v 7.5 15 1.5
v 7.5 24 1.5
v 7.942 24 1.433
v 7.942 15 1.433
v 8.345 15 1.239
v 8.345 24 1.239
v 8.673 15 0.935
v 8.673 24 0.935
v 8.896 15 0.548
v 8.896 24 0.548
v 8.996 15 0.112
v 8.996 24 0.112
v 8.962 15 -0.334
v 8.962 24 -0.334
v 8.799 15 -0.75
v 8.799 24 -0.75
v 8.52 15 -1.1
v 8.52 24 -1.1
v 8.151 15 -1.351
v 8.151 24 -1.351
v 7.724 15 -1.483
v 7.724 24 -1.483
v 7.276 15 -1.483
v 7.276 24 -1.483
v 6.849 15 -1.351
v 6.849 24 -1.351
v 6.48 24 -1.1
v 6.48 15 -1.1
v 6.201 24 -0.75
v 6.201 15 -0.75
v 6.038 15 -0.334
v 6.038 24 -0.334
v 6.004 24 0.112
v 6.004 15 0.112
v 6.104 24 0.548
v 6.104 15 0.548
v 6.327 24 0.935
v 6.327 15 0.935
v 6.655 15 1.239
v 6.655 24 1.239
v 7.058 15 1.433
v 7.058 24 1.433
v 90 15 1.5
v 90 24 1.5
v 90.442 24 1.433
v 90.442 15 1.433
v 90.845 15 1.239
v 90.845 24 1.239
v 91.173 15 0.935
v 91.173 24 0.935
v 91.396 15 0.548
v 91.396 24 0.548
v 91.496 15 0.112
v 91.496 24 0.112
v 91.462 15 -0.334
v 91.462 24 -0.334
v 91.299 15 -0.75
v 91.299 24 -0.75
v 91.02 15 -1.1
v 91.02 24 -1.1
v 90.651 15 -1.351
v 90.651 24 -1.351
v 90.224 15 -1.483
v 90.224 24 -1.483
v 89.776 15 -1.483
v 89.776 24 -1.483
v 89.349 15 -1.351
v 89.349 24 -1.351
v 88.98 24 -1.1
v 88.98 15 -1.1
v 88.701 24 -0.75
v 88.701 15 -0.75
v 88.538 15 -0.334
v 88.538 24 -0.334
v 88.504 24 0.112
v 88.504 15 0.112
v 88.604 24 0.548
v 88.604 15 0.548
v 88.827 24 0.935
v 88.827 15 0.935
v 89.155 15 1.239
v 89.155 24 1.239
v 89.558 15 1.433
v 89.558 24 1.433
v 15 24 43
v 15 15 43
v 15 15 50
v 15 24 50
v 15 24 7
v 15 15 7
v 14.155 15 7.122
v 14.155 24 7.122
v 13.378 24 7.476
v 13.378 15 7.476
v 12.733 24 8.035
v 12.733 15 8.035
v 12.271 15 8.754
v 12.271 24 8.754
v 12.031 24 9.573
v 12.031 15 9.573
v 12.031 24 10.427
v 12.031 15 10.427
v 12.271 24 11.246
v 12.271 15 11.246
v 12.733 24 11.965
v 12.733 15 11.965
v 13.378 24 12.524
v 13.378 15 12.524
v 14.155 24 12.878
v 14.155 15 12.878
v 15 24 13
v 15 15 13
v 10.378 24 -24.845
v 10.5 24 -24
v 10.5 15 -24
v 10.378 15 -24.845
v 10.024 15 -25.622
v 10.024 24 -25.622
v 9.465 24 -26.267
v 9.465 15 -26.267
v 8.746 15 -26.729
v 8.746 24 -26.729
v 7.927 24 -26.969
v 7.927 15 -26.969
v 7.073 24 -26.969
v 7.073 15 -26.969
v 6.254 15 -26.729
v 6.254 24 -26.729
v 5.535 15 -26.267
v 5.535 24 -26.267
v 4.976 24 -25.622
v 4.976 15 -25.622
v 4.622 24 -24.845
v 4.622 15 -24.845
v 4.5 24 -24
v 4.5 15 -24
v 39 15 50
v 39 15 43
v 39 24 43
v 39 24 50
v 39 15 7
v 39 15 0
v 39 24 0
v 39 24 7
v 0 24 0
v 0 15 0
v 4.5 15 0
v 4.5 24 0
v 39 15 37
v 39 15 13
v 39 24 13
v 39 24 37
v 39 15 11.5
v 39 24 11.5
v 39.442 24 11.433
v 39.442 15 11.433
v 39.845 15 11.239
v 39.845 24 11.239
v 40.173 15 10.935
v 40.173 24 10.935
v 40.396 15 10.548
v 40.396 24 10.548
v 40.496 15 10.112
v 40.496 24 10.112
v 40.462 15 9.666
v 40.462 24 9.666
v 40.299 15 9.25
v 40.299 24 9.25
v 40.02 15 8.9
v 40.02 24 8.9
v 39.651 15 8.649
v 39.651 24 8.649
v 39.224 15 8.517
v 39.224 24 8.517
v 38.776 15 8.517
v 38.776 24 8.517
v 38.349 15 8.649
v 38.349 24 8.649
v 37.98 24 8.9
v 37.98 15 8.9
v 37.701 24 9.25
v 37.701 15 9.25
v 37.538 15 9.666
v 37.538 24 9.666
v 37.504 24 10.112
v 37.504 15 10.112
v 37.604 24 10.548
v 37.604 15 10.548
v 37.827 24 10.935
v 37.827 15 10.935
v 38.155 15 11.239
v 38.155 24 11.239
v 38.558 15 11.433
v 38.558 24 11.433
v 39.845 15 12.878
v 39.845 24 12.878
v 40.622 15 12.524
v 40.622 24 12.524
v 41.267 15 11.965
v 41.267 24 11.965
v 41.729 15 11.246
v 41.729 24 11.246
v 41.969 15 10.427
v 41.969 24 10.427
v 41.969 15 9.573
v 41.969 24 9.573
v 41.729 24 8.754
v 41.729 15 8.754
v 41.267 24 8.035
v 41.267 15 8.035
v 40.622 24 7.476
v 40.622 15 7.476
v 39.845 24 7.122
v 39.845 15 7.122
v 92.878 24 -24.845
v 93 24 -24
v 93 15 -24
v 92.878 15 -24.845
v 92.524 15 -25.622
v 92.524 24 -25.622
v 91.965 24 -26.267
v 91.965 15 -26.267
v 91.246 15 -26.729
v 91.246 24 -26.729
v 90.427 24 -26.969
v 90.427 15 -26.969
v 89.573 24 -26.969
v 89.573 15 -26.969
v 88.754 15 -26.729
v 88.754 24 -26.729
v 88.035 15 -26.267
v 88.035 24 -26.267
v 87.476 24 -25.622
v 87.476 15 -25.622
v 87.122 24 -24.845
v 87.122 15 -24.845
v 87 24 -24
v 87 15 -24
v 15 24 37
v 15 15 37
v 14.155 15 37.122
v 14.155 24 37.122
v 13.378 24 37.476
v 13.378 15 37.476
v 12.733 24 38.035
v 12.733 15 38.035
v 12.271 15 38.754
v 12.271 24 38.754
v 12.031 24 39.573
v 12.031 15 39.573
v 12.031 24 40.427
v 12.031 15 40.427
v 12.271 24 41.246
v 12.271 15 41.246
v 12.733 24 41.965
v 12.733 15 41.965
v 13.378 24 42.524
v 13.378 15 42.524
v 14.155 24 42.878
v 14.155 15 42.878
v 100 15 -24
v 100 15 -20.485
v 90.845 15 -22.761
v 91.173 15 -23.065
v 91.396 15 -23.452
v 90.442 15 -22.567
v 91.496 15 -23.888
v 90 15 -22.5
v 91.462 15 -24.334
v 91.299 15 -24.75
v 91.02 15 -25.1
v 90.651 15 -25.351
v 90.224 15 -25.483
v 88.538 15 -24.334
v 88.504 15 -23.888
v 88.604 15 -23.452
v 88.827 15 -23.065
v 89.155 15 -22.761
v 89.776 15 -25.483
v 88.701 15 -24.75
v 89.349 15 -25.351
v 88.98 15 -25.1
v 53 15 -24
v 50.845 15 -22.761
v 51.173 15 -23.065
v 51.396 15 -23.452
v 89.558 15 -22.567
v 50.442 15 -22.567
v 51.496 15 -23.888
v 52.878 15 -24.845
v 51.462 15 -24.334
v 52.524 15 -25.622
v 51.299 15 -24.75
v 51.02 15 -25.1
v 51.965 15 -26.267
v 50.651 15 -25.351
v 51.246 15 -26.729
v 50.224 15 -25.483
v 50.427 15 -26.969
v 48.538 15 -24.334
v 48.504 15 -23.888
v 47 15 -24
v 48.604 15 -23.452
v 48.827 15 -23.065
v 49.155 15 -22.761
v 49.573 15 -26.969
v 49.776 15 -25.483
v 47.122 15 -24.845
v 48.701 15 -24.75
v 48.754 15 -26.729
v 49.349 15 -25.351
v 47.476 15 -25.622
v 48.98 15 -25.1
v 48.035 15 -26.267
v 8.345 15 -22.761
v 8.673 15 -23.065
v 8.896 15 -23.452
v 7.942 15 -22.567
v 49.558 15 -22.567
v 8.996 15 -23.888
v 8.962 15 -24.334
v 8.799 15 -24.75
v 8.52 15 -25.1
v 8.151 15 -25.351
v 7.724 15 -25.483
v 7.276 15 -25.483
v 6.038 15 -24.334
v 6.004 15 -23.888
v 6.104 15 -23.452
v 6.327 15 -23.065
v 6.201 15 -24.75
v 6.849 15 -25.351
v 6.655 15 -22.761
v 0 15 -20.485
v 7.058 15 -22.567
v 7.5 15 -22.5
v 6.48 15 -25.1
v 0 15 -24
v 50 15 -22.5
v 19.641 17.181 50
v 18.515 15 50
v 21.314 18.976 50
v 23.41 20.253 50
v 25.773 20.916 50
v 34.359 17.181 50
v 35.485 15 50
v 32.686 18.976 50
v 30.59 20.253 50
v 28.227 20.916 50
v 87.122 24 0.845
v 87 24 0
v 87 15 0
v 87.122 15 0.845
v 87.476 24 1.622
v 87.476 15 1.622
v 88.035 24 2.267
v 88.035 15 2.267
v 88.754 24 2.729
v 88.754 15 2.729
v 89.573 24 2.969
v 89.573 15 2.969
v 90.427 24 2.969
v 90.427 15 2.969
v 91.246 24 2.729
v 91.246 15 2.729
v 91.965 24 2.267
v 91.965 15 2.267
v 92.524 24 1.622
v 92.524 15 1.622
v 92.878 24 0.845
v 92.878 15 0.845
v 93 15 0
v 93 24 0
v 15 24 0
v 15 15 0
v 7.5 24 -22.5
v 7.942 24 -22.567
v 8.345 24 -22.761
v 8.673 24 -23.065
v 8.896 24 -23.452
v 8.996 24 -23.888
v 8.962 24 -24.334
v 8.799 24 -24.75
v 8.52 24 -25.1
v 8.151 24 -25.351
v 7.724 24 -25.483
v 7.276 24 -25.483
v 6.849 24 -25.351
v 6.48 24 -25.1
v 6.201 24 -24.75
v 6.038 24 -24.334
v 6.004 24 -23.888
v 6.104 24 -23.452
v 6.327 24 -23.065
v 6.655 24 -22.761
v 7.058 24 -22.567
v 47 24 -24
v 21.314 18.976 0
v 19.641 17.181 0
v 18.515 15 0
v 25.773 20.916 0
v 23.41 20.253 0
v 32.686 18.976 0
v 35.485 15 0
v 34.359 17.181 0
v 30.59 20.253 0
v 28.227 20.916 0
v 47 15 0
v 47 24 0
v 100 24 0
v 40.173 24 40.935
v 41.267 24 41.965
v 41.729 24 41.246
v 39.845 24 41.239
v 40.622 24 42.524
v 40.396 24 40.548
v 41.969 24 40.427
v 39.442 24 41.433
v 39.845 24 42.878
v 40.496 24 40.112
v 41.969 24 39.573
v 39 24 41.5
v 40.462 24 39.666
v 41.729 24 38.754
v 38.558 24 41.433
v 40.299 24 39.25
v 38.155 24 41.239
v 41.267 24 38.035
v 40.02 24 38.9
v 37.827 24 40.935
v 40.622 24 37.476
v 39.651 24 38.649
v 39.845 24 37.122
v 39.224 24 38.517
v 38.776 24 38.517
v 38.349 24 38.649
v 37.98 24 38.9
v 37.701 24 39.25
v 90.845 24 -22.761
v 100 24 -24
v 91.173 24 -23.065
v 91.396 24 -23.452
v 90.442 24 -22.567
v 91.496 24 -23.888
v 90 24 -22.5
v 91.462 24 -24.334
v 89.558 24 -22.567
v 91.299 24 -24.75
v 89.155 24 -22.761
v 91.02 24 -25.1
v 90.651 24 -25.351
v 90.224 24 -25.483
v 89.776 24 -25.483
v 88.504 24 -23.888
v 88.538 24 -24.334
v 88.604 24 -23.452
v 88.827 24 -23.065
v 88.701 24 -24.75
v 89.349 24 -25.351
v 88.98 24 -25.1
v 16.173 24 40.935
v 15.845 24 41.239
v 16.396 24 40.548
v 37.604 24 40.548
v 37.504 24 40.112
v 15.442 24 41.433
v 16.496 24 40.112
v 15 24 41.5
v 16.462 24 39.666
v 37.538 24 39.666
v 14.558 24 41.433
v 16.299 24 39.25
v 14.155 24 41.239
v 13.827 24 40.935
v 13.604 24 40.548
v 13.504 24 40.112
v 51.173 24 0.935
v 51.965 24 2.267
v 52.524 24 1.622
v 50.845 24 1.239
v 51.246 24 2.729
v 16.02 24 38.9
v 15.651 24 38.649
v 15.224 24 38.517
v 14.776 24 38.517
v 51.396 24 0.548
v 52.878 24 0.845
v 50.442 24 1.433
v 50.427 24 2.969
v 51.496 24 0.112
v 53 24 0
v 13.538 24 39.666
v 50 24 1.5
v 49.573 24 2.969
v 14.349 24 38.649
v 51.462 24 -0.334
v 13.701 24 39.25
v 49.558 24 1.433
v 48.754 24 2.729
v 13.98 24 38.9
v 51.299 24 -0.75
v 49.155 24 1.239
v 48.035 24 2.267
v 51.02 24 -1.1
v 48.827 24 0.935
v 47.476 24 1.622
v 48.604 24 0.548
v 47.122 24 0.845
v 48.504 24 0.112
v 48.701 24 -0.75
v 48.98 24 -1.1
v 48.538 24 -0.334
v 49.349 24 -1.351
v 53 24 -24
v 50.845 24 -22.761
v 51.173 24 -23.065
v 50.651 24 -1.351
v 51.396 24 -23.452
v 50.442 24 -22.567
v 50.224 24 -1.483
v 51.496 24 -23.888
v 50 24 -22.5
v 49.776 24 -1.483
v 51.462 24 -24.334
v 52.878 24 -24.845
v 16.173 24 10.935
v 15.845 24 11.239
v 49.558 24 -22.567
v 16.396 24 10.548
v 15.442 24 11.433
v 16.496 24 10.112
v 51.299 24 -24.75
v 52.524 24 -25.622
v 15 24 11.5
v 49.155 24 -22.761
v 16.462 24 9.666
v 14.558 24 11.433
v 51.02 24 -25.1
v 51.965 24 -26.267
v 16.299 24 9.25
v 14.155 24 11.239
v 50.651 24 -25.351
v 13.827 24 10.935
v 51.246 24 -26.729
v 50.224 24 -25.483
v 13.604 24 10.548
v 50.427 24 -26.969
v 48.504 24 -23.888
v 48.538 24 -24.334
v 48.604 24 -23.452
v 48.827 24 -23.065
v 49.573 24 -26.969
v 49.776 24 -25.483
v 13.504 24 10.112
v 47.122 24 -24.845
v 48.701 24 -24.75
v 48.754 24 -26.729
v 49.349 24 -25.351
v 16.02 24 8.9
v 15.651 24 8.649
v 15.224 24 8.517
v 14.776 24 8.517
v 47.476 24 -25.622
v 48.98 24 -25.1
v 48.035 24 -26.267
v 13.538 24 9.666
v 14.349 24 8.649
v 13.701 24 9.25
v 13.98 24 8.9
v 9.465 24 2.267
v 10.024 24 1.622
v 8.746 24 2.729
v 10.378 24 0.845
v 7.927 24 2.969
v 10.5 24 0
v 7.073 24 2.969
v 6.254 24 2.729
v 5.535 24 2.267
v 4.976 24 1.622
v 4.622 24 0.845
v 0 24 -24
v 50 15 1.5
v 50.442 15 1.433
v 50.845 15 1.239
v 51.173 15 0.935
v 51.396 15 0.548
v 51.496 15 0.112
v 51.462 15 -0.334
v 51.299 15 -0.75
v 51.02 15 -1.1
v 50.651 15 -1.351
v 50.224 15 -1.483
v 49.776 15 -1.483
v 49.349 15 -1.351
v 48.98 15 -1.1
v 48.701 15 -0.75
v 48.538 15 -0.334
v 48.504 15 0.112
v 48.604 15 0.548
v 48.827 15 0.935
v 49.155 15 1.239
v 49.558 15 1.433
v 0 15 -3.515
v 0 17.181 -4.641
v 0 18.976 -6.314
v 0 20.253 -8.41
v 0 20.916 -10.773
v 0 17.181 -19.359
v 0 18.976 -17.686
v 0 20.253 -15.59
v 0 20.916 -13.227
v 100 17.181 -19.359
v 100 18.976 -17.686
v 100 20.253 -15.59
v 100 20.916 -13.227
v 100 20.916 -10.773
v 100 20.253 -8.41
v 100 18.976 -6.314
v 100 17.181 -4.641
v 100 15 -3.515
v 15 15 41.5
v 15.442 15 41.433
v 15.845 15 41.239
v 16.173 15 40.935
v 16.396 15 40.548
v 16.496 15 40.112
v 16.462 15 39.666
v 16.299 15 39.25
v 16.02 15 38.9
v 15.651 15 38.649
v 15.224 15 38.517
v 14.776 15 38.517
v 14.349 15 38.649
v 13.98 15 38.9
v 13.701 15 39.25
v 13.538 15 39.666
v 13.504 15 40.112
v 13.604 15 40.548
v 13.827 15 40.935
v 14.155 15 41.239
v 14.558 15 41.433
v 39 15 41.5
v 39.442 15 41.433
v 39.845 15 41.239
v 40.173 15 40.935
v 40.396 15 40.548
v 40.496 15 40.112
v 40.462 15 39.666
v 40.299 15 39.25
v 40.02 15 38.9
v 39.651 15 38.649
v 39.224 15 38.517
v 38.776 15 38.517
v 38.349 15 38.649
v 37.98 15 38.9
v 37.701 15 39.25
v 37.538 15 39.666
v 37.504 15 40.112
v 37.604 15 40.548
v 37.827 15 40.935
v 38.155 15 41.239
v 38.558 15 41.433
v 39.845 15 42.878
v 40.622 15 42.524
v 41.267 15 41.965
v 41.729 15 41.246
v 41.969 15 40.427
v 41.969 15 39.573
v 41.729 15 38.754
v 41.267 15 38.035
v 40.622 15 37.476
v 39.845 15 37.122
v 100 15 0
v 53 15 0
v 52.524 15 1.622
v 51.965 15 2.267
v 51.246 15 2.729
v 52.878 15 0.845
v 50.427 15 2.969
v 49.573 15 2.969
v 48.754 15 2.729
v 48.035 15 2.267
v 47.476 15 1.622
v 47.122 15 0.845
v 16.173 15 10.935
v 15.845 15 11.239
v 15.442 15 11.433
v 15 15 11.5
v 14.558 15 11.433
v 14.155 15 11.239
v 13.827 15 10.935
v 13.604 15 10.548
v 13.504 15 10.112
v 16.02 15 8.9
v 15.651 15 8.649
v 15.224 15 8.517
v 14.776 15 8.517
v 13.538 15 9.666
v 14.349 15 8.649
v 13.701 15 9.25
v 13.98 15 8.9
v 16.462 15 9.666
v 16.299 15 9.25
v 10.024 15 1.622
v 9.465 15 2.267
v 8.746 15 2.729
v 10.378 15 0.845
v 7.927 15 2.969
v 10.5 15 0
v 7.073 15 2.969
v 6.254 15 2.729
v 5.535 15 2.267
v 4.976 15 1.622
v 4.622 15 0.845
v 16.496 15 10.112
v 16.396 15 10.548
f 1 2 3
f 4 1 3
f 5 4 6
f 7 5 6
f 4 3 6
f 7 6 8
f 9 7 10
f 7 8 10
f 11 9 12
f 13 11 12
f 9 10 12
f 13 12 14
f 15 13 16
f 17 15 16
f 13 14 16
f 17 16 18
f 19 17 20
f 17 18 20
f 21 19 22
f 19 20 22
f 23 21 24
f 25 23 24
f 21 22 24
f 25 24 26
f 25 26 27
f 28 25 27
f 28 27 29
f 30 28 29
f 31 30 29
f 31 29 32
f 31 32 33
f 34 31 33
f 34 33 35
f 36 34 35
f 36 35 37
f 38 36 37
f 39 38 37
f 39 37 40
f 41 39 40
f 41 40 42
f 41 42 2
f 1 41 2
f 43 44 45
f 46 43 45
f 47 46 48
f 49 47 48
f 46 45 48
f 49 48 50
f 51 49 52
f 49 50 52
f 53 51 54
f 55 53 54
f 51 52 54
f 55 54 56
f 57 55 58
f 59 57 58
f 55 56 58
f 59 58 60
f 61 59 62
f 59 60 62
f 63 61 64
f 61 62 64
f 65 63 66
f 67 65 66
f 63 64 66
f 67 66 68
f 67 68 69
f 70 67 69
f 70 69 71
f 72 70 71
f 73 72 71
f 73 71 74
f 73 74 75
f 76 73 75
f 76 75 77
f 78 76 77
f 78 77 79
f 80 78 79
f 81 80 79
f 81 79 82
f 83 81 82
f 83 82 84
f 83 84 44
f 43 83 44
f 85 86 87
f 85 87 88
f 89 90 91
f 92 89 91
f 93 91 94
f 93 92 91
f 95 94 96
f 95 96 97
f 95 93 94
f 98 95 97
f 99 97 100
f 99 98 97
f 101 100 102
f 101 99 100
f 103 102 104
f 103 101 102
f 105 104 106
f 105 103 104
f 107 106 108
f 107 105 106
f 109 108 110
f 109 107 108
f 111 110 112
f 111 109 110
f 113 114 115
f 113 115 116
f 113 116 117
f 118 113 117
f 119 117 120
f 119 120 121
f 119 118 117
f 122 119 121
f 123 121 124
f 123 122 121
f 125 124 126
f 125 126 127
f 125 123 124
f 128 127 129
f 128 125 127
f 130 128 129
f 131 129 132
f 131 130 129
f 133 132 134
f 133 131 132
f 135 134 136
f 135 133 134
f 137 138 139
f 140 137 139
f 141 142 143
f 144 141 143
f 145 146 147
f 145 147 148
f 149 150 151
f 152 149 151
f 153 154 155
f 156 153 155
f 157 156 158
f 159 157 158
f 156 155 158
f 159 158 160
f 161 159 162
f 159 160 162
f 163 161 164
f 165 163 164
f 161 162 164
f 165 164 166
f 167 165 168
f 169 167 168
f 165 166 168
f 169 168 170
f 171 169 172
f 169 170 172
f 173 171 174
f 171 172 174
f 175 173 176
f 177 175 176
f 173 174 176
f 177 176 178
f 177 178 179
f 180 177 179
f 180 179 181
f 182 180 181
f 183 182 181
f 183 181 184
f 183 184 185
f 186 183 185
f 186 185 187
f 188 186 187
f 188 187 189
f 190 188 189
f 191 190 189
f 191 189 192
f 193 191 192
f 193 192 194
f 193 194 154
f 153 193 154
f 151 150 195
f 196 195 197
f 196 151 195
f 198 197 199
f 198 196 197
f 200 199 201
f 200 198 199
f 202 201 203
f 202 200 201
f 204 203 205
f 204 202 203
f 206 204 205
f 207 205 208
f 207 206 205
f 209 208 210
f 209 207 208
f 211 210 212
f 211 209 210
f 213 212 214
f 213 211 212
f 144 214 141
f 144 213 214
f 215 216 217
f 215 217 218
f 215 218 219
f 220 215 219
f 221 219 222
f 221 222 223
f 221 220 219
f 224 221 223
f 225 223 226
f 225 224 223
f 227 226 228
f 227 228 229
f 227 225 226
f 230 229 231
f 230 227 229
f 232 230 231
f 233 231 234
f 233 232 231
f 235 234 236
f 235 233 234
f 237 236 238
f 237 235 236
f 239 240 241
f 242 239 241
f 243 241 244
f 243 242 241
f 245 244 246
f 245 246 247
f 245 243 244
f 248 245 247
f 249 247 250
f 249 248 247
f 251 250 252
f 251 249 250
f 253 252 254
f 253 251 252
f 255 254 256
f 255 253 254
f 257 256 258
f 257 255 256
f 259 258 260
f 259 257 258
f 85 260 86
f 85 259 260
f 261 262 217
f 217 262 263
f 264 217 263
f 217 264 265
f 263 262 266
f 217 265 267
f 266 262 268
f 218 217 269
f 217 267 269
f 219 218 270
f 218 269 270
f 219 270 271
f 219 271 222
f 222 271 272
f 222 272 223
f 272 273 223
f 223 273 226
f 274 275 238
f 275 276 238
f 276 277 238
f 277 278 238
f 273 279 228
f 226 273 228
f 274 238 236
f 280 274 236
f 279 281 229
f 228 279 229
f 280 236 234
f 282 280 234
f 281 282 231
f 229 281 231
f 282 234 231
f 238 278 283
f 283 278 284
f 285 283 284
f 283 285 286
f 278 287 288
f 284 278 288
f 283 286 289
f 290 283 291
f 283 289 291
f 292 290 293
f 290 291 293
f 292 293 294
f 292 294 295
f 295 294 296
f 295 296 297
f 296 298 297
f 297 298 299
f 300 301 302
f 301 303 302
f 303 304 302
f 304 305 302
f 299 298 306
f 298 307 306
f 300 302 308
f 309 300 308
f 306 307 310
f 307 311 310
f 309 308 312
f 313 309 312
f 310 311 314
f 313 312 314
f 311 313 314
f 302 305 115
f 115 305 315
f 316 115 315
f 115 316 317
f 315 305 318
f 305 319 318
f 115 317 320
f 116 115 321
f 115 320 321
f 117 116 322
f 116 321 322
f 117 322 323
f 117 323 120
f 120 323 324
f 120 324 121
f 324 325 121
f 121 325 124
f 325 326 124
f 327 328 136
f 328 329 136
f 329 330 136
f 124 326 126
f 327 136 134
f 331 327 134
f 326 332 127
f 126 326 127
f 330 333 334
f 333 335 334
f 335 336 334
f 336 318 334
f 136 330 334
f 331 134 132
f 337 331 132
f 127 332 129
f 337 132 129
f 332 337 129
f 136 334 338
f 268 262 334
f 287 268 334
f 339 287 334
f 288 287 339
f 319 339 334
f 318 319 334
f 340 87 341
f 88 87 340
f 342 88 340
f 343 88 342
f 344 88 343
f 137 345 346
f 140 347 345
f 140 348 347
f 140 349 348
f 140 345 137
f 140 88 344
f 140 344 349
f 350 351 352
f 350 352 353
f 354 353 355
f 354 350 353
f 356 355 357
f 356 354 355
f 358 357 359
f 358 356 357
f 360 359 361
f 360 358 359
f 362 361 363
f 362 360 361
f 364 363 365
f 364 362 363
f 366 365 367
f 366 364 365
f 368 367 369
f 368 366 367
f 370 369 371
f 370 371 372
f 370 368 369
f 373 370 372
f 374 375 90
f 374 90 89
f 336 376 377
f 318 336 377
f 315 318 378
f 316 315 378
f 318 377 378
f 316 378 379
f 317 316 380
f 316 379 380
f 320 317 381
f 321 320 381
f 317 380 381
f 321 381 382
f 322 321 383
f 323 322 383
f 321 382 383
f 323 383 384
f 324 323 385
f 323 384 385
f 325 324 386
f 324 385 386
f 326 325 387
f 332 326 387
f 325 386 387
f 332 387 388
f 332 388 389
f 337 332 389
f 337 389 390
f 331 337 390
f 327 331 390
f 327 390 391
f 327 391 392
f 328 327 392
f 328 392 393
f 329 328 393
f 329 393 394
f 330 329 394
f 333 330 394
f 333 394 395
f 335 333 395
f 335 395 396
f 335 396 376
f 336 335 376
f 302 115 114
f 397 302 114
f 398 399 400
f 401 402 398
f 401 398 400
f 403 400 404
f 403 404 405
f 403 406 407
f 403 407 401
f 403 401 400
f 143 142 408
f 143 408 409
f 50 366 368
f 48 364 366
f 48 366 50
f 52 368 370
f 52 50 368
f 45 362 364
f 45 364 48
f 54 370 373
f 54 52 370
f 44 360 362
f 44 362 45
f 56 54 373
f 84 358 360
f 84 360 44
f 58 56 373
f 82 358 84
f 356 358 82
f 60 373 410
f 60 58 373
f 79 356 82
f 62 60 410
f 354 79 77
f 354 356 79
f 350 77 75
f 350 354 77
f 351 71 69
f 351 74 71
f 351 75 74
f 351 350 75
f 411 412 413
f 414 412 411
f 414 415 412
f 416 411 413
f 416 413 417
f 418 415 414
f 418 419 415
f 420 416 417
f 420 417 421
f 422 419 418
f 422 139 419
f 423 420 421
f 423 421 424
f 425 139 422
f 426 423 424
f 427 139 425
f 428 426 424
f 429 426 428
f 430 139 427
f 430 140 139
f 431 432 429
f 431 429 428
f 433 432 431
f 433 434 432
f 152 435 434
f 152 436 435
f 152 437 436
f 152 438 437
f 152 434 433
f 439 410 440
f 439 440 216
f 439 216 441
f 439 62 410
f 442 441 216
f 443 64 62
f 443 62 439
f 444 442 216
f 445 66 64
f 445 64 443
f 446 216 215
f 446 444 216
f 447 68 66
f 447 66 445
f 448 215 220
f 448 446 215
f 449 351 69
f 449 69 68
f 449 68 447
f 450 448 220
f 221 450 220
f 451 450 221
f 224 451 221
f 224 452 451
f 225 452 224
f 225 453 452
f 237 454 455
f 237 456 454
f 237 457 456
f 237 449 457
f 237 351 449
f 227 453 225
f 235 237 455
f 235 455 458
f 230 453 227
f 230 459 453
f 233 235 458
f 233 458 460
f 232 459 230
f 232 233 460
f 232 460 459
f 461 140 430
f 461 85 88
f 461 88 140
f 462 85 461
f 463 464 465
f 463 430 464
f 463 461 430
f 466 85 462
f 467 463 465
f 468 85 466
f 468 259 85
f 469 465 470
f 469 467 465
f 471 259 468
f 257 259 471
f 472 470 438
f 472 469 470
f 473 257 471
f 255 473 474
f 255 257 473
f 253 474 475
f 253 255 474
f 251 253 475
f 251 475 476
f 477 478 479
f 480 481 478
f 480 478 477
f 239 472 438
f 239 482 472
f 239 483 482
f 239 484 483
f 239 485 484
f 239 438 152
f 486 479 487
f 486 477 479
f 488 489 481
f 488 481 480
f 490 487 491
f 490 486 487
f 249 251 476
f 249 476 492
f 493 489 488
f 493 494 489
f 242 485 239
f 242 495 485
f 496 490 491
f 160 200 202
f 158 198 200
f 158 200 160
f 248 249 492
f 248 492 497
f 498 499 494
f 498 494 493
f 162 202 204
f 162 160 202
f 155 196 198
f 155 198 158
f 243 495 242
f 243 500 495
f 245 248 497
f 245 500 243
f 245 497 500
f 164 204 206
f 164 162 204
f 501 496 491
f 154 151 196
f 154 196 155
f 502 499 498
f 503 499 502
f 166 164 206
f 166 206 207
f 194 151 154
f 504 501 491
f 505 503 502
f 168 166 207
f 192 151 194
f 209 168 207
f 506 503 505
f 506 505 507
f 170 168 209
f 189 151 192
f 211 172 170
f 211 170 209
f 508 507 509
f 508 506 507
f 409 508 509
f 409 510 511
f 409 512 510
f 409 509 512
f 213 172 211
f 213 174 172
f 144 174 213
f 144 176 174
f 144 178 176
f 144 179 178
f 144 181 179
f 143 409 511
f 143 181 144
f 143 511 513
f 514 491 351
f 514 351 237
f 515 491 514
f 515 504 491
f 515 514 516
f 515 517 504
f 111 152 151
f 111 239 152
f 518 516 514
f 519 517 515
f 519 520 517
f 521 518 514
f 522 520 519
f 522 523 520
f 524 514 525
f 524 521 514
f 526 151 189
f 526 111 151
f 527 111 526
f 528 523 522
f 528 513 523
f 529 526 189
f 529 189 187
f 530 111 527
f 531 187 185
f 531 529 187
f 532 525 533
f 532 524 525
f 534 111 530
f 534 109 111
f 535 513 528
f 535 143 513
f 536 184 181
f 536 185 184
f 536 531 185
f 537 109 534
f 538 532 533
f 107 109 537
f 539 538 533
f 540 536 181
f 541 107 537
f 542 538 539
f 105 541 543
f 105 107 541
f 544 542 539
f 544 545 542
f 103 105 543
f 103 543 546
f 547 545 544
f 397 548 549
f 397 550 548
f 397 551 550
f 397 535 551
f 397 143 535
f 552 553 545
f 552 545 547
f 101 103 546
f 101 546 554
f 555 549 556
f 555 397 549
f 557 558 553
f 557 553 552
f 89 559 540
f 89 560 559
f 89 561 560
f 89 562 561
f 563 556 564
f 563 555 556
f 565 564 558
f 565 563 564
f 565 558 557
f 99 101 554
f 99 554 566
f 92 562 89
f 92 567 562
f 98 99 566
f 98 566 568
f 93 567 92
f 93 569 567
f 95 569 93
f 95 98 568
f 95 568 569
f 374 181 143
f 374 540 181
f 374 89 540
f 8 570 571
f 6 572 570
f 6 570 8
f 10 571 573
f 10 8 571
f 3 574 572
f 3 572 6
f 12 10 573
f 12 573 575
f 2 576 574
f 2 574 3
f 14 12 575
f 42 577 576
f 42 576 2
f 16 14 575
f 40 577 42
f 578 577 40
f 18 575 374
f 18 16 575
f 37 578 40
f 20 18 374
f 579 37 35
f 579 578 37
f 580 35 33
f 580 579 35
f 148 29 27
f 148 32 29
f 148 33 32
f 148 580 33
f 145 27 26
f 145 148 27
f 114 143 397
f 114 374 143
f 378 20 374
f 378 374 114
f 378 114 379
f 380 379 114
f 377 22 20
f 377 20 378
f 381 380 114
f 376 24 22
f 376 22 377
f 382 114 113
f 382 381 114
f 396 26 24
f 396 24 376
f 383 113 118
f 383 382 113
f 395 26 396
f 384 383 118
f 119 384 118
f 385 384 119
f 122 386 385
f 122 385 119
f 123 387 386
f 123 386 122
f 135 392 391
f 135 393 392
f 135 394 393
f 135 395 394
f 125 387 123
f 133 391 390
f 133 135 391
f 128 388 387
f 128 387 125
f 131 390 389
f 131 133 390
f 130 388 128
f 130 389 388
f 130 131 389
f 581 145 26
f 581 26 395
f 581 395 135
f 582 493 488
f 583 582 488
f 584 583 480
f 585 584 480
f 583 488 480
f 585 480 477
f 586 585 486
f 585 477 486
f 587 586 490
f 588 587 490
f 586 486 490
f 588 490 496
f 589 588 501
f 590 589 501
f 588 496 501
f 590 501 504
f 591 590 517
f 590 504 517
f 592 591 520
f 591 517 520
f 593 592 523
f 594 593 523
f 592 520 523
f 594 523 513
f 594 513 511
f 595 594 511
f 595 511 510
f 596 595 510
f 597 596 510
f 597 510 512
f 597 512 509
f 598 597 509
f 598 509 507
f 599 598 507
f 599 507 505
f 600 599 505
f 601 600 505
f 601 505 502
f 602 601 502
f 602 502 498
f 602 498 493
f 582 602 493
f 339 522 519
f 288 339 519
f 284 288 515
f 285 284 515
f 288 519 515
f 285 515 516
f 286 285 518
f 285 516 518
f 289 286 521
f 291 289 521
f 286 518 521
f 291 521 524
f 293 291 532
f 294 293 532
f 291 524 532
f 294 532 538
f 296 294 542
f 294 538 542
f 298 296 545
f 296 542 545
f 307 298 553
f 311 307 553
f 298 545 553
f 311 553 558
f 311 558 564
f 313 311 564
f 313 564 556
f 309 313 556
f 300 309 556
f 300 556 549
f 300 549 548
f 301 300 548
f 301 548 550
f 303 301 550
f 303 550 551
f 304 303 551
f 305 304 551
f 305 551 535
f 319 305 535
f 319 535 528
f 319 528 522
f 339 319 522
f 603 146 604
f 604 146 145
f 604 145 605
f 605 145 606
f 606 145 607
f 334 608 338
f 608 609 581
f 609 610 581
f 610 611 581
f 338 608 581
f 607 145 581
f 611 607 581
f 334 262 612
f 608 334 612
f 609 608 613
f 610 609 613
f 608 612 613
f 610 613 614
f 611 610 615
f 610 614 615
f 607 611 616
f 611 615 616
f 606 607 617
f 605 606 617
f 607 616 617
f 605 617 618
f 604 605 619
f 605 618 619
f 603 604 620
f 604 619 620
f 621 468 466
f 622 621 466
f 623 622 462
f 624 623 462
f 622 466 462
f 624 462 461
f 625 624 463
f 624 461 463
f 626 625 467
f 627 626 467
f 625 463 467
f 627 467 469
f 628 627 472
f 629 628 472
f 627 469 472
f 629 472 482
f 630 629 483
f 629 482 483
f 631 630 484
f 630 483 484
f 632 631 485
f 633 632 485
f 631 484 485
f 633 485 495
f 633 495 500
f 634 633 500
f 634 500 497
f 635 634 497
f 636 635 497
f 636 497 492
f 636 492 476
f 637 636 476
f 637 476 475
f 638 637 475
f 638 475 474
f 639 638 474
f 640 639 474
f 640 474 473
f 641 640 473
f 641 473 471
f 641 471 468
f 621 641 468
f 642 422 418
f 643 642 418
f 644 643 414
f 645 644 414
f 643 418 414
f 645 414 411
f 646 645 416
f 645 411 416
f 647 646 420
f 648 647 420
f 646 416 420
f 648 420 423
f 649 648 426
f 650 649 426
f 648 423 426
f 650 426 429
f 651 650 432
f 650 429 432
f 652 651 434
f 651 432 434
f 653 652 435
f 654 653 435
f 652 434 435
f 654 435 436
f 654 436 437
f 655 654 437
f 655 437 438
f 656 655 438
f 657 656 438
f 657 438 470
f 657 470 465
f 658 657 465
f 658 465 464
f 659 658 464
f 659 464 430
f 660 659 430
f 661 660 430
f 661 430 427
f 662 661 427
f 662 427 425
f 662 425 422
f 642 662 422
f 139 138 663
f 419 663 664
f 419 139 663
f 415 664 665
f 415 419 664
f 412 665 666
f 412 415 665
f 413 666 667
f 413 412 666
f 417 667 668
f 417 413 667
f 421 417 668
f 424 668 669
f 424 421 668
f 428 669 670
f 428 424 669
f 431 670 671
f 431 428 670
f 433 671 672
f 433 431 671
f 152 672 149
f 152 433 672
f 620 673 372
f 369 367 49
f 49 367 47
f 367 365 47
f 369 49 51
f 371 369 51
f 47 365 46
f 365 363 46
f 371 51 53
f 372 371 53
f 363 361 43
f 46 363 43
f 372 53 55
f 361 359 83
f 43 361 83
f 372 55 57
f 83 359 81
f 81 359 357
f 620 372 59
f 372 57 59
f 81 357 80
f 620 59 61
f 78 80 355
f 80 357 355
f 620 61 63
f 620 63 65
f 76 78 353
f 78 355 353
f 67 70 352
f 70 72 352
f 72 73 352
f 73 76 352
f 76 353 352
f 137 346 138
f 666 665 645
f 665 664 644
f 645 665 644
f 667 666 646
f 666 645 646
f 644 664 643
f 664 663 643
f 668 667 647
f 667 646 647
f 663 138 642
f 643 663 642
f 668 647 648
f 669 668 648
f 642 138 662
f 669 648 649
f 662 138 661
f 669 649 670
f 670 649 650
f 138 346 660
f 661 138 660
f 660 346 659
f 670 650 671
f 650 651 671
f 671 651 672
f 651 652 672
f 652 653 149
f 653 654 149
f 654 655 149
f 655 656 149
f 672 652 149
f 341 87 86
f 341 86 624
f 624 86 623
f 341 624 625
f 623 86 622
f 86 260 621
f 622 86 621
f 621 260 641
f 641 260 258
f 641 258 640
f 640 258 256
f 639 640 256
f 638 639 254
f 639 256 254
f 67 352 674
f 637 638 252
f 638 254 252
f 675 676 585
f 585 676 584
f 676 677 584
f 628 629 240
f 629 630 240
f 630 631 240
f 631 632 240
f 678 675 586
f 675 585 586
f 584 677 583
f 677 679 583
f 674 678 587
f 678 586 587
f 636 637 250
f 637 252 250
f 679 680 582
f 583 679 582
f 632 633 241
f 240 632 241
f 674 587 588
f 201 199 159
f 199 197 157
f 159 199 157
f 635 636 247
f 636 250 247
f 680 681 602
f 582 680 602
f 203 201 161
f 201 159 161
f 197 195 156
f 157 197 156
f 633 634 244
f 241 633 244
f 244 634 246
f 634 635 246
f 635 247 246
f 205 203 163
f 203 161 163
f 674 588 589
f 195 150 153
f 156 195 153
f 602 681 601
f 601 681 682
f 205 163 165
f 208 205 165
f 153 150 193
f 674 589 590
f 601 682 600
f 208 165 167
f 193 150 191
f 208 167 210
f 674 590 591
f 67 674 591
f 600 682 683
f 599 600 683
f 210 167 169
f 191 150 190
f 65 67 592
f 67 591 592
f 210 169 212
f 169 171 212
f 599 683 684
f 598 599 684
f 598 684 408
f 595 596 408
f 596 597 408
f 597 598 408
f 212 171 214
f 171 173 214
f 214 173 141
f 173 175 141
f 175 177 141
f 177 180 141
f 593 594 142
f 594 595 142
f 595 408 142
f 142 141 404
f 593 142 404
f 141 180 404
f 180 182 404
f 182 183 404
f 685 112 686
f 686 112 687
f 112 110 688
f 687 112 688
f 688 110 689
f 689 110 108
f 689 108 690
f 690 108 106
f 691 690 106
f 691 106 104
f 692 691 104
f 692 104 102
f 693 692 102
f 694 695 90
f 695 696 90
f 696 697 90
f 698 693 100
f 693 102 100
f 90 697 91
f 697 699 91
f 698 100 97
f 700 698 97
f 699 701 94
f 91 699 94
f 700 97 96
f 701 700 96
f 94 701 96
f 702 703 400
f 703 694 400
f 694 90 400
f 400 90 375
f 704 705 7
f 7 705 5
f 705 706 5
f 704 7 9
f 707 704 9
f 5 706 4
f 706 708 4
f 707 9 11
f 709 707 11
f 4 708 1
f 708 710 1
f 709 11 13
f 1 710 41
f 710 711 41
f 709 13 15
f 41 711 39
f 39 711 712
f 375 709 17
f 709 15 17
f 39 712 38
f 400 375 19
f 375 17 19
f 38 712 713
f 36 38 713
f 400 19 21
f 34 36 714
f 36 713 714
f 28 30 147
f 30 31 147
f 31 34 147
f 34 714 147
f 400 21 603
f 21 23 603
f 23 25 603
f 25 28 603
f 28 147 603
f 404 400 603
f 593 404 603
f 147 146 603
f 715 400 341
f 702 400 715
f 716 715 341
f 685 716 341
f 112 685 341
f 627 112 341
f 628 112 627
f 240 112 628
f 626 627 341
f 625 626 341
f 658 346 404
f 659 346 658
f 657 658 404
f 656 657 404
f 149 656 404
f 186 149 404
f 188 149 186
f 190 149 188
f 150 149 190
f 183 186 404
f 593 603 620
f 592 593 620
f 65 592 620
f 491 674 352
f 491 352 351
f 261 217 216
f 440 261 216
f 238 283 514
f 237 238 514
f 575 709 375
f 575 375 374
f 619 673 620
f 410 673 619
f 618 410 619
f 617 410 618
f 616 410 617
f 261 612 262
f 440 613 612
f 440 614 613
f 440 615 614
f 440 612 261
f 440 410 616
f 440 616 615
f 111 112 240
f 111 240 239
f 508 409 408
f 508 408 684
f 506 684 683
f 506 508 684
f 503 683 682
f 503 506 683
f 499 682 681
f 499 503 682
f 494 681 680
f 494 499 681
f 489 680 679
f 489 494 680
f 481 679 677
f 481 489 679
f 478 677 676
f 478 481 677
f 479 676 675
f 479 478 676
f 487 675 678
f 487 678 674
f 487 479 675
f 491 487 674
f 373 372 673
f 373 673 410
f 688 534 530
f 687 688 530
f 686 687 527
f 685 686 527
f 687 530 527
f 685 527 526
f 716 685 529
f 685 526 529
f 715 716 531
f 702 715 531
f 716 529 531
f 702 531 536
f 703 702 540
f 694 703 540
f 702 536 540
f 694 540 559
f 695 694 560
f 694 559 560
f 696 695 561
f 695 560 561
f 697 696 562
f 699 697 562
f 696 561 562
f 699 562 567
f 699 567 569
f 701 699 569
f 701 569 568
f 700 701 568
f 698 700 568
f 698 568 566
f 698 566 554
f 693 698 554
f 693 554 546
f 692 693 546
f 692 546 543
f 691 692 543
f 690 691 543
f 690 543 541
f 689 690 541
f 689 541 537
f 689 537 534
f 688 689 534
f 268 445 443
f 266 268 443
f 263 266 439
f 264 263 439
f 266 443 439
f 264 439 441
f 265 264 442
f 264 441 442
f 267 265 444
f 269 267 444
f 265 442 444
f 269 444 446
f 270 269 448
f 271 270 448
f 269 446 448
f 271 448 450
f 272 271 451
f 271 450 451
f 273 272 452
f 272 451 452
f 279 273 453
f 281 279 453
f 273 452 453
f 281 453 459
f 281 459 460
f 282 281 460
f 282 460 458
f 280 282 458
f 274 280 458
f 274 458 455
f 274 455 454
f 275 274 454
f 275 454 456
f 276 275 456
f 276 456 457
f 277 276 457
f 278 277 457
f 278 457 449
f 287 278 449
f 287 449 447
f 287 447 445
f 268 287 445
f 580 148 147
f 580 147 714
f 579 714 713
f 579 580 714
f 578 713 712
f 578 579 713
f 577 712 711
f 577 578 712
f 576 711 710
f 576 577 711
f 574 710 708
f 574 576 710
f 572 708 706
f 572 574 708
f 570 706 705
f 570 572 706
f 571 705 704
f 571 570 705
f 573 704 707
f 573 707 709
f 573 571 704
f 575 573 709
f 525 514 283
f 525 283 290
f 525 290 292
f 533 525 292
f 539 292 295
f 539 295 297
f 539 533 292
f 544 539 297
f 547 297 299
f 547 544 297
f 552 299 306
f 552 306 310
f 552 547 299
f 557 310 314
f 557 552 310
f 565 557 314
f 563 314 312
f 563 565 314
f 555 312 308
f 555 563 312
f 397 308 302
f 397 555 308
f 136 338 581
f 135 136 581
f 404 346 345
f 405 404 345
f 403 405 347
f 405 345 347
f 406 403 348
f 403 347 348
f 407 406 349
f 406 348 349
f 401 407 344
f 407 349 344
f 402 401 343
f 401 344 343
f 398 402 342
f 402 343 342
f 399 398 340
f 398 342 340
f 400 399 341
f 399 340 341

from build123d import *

# Parameters (mm, degrees)
SKETCH1_W               = 24
SKETCH1_H               = 24
BOSS_EXTRUDE1_DEPTH     = 100
SKETCH2_R               = 9
CUT_EXTRUDE1_DEPTH      = 100
SKETCH3_W               = 24
SKETCH3_H               = 24
BOSS_EXTRUDE2_DEPTH     = 50
SKETCH4_R               = 9
CUT_EXTRUDE2_DEPTH      = 50
SKETCH5_R               = 3
BOSS_EXTRUDE3_DEPTH     = 24
SKETCH6_R               = 1.5
CUT_EXTRUDE3_DEPTH      = 24
CUT_EXTRUDE4_DEPTH      = 115.350338871
CUT_EXTRUDE4_DEPTH_BACK = 115.350338871
SKETCH7_W               = 77
SKETCH7_H               = 15


with BuildPart() as part:
    # Sketch1 → Boss-Extrude1 (new body)
    with BuildSketch(Plane(origin=(0, 0, 0), x_dir=(0, 0, -1), z_dir=(1, 0, 0))):
        with Locations((12, 12)):
            Rectangle(SKETCH1_W, SKETCH1_H)
    extrude(amount=BOSS_EXTRUDE1_DEPTH)

    # Sketch2 → Cut-Extrude1 (cut)
    with BuildSketch(Plane(origin=(100, 0, 0), x_dir=(0, 0, -1), z_dir=(1, 0, 0))):
        with Locations((12, 12)):
            Circle(SKETCH2_R)
    extrude(amount=-CUT_EXTRUDE1_DEPTH, mode=Mode.SUBTRACT)

    # Sketch3 → Boss-Extrude2 (add)
    with BuildSketch(Plane.XY):
        with Locations((27, 12)):
            Rectangle(SKETCH3_W, SKETCH3_H)
    extrude(amount=BOSS_EXTRUDE2_DEPTH)

    # Sketch4 → Cut-Extrude2 (cut)
    with BuildSketch(Plane.XY.offset(50)):
        with Locations((27, 12)):
            Circle(SKETCH4_R)
    extrude(amount=-CUT_EXTRUDE2_DEPTH, mode=Mode.SUBTRACT)

    # Sketch5 → Boss-Extrude3 (add)
    with BuildSketch(Plane(origin=(0, 24, 0), x_dir=(1, 0, 0), z_dir=(0, 1, 0))):
        with Locations((90, 0)):
            Circle(SKETCH5_R)
        with Locations((90, 24)):
            Circle(SKETCH5_R)
        with Locations((50, 0)):
            Circle(SKETCH5_R)
        with Locations((50, 24)):
            Circle(SKETCH5_R)
        with Locations((7.5, 0)):
            Circle(SKETCH5_R)
        with Locations((7.5, 24)):
            Circle(SKETCH5_R)
        with Locations((15, -10)):
            Circle(SKETCH5_R)
        with Locations((39, -10)):
            Circle(SKETCH5_R)
        with Locations((15, -40)):
            Circle(SKETCH5_R)
        with Locations((39, -40)):
            Circle(SKETCH5_R)
    extrude(amount=-BOSS_EXTRUDE3_DEPTH)

    # Sketch6 → Cut-Extrude3 (cut)
    with BuildSketch(Plane(origin=(0, 24, 0), x_dir=(1, 0, 0), z_dir=(0, 1, 0))):
        with Locations(Location((50, 24, 0), (0, 0, 270))):
            Circle(SKETCH6_R)
        with Locations(Location((50, 0, 0), (0, 0, 270))):
            Circle(SKETCH6_R)
        with Locations(Location((90, 24, 0), (0, 0, 270))):
            Circle(SKETCH6_R)
        with Locations(Location((90, 0, 0), (0, 0, 270))):
            Circle(SKETCH6_R)
        with Locations(Location((15, -40, 0), (0, 0, 270))):
            Circle(SKETCH6_R)
        with Locations(Location((15, -10, 0), (0, 0, 270))):
            Circle(SKETCH6_R)
        with Locations(Location((39, -10, 0), (0, 0, 270))):
            Circle(SKETCH6_R)
        with Locations(Location((39, -40, 0), (0, 0, 270))):
            Circle(SKETCH6_R)
        with Locations(Location((7.5, 0, 0), (0, 0, 270))):
            Circle(SKETCH6_R)
        with Locations(Location((7.5, 24, 0), (0, 0, 270))):
            Circle(SKETCH6_R)
    extrude(amount=-CUT_EXTRUDE3_DEPTH, mode=Mode.SUBTRACT)

    # Sketch7 → Cut-Extrude4 (cut, two sides: drawn at the far end of the back side and taken through both)
    with BuildSketch(Plane(origin=(100, 0, 0), x_dir=(0, 0, -1), z_dir=(1, 0, 0)).offset(-CUT_EXTRUDE4_DEPTH_BACK)):
        with Locations((-11.5, 7.5)):
            Rectangle(SKETCH7_W, SKETCH7_H)
    extrude(amount=CUT_EXTRUDE4_DEPTH + CUT_EXTRUDE4_DEPTH_BACK, mode=Mode.SUBTRACT)


solid = part.part
